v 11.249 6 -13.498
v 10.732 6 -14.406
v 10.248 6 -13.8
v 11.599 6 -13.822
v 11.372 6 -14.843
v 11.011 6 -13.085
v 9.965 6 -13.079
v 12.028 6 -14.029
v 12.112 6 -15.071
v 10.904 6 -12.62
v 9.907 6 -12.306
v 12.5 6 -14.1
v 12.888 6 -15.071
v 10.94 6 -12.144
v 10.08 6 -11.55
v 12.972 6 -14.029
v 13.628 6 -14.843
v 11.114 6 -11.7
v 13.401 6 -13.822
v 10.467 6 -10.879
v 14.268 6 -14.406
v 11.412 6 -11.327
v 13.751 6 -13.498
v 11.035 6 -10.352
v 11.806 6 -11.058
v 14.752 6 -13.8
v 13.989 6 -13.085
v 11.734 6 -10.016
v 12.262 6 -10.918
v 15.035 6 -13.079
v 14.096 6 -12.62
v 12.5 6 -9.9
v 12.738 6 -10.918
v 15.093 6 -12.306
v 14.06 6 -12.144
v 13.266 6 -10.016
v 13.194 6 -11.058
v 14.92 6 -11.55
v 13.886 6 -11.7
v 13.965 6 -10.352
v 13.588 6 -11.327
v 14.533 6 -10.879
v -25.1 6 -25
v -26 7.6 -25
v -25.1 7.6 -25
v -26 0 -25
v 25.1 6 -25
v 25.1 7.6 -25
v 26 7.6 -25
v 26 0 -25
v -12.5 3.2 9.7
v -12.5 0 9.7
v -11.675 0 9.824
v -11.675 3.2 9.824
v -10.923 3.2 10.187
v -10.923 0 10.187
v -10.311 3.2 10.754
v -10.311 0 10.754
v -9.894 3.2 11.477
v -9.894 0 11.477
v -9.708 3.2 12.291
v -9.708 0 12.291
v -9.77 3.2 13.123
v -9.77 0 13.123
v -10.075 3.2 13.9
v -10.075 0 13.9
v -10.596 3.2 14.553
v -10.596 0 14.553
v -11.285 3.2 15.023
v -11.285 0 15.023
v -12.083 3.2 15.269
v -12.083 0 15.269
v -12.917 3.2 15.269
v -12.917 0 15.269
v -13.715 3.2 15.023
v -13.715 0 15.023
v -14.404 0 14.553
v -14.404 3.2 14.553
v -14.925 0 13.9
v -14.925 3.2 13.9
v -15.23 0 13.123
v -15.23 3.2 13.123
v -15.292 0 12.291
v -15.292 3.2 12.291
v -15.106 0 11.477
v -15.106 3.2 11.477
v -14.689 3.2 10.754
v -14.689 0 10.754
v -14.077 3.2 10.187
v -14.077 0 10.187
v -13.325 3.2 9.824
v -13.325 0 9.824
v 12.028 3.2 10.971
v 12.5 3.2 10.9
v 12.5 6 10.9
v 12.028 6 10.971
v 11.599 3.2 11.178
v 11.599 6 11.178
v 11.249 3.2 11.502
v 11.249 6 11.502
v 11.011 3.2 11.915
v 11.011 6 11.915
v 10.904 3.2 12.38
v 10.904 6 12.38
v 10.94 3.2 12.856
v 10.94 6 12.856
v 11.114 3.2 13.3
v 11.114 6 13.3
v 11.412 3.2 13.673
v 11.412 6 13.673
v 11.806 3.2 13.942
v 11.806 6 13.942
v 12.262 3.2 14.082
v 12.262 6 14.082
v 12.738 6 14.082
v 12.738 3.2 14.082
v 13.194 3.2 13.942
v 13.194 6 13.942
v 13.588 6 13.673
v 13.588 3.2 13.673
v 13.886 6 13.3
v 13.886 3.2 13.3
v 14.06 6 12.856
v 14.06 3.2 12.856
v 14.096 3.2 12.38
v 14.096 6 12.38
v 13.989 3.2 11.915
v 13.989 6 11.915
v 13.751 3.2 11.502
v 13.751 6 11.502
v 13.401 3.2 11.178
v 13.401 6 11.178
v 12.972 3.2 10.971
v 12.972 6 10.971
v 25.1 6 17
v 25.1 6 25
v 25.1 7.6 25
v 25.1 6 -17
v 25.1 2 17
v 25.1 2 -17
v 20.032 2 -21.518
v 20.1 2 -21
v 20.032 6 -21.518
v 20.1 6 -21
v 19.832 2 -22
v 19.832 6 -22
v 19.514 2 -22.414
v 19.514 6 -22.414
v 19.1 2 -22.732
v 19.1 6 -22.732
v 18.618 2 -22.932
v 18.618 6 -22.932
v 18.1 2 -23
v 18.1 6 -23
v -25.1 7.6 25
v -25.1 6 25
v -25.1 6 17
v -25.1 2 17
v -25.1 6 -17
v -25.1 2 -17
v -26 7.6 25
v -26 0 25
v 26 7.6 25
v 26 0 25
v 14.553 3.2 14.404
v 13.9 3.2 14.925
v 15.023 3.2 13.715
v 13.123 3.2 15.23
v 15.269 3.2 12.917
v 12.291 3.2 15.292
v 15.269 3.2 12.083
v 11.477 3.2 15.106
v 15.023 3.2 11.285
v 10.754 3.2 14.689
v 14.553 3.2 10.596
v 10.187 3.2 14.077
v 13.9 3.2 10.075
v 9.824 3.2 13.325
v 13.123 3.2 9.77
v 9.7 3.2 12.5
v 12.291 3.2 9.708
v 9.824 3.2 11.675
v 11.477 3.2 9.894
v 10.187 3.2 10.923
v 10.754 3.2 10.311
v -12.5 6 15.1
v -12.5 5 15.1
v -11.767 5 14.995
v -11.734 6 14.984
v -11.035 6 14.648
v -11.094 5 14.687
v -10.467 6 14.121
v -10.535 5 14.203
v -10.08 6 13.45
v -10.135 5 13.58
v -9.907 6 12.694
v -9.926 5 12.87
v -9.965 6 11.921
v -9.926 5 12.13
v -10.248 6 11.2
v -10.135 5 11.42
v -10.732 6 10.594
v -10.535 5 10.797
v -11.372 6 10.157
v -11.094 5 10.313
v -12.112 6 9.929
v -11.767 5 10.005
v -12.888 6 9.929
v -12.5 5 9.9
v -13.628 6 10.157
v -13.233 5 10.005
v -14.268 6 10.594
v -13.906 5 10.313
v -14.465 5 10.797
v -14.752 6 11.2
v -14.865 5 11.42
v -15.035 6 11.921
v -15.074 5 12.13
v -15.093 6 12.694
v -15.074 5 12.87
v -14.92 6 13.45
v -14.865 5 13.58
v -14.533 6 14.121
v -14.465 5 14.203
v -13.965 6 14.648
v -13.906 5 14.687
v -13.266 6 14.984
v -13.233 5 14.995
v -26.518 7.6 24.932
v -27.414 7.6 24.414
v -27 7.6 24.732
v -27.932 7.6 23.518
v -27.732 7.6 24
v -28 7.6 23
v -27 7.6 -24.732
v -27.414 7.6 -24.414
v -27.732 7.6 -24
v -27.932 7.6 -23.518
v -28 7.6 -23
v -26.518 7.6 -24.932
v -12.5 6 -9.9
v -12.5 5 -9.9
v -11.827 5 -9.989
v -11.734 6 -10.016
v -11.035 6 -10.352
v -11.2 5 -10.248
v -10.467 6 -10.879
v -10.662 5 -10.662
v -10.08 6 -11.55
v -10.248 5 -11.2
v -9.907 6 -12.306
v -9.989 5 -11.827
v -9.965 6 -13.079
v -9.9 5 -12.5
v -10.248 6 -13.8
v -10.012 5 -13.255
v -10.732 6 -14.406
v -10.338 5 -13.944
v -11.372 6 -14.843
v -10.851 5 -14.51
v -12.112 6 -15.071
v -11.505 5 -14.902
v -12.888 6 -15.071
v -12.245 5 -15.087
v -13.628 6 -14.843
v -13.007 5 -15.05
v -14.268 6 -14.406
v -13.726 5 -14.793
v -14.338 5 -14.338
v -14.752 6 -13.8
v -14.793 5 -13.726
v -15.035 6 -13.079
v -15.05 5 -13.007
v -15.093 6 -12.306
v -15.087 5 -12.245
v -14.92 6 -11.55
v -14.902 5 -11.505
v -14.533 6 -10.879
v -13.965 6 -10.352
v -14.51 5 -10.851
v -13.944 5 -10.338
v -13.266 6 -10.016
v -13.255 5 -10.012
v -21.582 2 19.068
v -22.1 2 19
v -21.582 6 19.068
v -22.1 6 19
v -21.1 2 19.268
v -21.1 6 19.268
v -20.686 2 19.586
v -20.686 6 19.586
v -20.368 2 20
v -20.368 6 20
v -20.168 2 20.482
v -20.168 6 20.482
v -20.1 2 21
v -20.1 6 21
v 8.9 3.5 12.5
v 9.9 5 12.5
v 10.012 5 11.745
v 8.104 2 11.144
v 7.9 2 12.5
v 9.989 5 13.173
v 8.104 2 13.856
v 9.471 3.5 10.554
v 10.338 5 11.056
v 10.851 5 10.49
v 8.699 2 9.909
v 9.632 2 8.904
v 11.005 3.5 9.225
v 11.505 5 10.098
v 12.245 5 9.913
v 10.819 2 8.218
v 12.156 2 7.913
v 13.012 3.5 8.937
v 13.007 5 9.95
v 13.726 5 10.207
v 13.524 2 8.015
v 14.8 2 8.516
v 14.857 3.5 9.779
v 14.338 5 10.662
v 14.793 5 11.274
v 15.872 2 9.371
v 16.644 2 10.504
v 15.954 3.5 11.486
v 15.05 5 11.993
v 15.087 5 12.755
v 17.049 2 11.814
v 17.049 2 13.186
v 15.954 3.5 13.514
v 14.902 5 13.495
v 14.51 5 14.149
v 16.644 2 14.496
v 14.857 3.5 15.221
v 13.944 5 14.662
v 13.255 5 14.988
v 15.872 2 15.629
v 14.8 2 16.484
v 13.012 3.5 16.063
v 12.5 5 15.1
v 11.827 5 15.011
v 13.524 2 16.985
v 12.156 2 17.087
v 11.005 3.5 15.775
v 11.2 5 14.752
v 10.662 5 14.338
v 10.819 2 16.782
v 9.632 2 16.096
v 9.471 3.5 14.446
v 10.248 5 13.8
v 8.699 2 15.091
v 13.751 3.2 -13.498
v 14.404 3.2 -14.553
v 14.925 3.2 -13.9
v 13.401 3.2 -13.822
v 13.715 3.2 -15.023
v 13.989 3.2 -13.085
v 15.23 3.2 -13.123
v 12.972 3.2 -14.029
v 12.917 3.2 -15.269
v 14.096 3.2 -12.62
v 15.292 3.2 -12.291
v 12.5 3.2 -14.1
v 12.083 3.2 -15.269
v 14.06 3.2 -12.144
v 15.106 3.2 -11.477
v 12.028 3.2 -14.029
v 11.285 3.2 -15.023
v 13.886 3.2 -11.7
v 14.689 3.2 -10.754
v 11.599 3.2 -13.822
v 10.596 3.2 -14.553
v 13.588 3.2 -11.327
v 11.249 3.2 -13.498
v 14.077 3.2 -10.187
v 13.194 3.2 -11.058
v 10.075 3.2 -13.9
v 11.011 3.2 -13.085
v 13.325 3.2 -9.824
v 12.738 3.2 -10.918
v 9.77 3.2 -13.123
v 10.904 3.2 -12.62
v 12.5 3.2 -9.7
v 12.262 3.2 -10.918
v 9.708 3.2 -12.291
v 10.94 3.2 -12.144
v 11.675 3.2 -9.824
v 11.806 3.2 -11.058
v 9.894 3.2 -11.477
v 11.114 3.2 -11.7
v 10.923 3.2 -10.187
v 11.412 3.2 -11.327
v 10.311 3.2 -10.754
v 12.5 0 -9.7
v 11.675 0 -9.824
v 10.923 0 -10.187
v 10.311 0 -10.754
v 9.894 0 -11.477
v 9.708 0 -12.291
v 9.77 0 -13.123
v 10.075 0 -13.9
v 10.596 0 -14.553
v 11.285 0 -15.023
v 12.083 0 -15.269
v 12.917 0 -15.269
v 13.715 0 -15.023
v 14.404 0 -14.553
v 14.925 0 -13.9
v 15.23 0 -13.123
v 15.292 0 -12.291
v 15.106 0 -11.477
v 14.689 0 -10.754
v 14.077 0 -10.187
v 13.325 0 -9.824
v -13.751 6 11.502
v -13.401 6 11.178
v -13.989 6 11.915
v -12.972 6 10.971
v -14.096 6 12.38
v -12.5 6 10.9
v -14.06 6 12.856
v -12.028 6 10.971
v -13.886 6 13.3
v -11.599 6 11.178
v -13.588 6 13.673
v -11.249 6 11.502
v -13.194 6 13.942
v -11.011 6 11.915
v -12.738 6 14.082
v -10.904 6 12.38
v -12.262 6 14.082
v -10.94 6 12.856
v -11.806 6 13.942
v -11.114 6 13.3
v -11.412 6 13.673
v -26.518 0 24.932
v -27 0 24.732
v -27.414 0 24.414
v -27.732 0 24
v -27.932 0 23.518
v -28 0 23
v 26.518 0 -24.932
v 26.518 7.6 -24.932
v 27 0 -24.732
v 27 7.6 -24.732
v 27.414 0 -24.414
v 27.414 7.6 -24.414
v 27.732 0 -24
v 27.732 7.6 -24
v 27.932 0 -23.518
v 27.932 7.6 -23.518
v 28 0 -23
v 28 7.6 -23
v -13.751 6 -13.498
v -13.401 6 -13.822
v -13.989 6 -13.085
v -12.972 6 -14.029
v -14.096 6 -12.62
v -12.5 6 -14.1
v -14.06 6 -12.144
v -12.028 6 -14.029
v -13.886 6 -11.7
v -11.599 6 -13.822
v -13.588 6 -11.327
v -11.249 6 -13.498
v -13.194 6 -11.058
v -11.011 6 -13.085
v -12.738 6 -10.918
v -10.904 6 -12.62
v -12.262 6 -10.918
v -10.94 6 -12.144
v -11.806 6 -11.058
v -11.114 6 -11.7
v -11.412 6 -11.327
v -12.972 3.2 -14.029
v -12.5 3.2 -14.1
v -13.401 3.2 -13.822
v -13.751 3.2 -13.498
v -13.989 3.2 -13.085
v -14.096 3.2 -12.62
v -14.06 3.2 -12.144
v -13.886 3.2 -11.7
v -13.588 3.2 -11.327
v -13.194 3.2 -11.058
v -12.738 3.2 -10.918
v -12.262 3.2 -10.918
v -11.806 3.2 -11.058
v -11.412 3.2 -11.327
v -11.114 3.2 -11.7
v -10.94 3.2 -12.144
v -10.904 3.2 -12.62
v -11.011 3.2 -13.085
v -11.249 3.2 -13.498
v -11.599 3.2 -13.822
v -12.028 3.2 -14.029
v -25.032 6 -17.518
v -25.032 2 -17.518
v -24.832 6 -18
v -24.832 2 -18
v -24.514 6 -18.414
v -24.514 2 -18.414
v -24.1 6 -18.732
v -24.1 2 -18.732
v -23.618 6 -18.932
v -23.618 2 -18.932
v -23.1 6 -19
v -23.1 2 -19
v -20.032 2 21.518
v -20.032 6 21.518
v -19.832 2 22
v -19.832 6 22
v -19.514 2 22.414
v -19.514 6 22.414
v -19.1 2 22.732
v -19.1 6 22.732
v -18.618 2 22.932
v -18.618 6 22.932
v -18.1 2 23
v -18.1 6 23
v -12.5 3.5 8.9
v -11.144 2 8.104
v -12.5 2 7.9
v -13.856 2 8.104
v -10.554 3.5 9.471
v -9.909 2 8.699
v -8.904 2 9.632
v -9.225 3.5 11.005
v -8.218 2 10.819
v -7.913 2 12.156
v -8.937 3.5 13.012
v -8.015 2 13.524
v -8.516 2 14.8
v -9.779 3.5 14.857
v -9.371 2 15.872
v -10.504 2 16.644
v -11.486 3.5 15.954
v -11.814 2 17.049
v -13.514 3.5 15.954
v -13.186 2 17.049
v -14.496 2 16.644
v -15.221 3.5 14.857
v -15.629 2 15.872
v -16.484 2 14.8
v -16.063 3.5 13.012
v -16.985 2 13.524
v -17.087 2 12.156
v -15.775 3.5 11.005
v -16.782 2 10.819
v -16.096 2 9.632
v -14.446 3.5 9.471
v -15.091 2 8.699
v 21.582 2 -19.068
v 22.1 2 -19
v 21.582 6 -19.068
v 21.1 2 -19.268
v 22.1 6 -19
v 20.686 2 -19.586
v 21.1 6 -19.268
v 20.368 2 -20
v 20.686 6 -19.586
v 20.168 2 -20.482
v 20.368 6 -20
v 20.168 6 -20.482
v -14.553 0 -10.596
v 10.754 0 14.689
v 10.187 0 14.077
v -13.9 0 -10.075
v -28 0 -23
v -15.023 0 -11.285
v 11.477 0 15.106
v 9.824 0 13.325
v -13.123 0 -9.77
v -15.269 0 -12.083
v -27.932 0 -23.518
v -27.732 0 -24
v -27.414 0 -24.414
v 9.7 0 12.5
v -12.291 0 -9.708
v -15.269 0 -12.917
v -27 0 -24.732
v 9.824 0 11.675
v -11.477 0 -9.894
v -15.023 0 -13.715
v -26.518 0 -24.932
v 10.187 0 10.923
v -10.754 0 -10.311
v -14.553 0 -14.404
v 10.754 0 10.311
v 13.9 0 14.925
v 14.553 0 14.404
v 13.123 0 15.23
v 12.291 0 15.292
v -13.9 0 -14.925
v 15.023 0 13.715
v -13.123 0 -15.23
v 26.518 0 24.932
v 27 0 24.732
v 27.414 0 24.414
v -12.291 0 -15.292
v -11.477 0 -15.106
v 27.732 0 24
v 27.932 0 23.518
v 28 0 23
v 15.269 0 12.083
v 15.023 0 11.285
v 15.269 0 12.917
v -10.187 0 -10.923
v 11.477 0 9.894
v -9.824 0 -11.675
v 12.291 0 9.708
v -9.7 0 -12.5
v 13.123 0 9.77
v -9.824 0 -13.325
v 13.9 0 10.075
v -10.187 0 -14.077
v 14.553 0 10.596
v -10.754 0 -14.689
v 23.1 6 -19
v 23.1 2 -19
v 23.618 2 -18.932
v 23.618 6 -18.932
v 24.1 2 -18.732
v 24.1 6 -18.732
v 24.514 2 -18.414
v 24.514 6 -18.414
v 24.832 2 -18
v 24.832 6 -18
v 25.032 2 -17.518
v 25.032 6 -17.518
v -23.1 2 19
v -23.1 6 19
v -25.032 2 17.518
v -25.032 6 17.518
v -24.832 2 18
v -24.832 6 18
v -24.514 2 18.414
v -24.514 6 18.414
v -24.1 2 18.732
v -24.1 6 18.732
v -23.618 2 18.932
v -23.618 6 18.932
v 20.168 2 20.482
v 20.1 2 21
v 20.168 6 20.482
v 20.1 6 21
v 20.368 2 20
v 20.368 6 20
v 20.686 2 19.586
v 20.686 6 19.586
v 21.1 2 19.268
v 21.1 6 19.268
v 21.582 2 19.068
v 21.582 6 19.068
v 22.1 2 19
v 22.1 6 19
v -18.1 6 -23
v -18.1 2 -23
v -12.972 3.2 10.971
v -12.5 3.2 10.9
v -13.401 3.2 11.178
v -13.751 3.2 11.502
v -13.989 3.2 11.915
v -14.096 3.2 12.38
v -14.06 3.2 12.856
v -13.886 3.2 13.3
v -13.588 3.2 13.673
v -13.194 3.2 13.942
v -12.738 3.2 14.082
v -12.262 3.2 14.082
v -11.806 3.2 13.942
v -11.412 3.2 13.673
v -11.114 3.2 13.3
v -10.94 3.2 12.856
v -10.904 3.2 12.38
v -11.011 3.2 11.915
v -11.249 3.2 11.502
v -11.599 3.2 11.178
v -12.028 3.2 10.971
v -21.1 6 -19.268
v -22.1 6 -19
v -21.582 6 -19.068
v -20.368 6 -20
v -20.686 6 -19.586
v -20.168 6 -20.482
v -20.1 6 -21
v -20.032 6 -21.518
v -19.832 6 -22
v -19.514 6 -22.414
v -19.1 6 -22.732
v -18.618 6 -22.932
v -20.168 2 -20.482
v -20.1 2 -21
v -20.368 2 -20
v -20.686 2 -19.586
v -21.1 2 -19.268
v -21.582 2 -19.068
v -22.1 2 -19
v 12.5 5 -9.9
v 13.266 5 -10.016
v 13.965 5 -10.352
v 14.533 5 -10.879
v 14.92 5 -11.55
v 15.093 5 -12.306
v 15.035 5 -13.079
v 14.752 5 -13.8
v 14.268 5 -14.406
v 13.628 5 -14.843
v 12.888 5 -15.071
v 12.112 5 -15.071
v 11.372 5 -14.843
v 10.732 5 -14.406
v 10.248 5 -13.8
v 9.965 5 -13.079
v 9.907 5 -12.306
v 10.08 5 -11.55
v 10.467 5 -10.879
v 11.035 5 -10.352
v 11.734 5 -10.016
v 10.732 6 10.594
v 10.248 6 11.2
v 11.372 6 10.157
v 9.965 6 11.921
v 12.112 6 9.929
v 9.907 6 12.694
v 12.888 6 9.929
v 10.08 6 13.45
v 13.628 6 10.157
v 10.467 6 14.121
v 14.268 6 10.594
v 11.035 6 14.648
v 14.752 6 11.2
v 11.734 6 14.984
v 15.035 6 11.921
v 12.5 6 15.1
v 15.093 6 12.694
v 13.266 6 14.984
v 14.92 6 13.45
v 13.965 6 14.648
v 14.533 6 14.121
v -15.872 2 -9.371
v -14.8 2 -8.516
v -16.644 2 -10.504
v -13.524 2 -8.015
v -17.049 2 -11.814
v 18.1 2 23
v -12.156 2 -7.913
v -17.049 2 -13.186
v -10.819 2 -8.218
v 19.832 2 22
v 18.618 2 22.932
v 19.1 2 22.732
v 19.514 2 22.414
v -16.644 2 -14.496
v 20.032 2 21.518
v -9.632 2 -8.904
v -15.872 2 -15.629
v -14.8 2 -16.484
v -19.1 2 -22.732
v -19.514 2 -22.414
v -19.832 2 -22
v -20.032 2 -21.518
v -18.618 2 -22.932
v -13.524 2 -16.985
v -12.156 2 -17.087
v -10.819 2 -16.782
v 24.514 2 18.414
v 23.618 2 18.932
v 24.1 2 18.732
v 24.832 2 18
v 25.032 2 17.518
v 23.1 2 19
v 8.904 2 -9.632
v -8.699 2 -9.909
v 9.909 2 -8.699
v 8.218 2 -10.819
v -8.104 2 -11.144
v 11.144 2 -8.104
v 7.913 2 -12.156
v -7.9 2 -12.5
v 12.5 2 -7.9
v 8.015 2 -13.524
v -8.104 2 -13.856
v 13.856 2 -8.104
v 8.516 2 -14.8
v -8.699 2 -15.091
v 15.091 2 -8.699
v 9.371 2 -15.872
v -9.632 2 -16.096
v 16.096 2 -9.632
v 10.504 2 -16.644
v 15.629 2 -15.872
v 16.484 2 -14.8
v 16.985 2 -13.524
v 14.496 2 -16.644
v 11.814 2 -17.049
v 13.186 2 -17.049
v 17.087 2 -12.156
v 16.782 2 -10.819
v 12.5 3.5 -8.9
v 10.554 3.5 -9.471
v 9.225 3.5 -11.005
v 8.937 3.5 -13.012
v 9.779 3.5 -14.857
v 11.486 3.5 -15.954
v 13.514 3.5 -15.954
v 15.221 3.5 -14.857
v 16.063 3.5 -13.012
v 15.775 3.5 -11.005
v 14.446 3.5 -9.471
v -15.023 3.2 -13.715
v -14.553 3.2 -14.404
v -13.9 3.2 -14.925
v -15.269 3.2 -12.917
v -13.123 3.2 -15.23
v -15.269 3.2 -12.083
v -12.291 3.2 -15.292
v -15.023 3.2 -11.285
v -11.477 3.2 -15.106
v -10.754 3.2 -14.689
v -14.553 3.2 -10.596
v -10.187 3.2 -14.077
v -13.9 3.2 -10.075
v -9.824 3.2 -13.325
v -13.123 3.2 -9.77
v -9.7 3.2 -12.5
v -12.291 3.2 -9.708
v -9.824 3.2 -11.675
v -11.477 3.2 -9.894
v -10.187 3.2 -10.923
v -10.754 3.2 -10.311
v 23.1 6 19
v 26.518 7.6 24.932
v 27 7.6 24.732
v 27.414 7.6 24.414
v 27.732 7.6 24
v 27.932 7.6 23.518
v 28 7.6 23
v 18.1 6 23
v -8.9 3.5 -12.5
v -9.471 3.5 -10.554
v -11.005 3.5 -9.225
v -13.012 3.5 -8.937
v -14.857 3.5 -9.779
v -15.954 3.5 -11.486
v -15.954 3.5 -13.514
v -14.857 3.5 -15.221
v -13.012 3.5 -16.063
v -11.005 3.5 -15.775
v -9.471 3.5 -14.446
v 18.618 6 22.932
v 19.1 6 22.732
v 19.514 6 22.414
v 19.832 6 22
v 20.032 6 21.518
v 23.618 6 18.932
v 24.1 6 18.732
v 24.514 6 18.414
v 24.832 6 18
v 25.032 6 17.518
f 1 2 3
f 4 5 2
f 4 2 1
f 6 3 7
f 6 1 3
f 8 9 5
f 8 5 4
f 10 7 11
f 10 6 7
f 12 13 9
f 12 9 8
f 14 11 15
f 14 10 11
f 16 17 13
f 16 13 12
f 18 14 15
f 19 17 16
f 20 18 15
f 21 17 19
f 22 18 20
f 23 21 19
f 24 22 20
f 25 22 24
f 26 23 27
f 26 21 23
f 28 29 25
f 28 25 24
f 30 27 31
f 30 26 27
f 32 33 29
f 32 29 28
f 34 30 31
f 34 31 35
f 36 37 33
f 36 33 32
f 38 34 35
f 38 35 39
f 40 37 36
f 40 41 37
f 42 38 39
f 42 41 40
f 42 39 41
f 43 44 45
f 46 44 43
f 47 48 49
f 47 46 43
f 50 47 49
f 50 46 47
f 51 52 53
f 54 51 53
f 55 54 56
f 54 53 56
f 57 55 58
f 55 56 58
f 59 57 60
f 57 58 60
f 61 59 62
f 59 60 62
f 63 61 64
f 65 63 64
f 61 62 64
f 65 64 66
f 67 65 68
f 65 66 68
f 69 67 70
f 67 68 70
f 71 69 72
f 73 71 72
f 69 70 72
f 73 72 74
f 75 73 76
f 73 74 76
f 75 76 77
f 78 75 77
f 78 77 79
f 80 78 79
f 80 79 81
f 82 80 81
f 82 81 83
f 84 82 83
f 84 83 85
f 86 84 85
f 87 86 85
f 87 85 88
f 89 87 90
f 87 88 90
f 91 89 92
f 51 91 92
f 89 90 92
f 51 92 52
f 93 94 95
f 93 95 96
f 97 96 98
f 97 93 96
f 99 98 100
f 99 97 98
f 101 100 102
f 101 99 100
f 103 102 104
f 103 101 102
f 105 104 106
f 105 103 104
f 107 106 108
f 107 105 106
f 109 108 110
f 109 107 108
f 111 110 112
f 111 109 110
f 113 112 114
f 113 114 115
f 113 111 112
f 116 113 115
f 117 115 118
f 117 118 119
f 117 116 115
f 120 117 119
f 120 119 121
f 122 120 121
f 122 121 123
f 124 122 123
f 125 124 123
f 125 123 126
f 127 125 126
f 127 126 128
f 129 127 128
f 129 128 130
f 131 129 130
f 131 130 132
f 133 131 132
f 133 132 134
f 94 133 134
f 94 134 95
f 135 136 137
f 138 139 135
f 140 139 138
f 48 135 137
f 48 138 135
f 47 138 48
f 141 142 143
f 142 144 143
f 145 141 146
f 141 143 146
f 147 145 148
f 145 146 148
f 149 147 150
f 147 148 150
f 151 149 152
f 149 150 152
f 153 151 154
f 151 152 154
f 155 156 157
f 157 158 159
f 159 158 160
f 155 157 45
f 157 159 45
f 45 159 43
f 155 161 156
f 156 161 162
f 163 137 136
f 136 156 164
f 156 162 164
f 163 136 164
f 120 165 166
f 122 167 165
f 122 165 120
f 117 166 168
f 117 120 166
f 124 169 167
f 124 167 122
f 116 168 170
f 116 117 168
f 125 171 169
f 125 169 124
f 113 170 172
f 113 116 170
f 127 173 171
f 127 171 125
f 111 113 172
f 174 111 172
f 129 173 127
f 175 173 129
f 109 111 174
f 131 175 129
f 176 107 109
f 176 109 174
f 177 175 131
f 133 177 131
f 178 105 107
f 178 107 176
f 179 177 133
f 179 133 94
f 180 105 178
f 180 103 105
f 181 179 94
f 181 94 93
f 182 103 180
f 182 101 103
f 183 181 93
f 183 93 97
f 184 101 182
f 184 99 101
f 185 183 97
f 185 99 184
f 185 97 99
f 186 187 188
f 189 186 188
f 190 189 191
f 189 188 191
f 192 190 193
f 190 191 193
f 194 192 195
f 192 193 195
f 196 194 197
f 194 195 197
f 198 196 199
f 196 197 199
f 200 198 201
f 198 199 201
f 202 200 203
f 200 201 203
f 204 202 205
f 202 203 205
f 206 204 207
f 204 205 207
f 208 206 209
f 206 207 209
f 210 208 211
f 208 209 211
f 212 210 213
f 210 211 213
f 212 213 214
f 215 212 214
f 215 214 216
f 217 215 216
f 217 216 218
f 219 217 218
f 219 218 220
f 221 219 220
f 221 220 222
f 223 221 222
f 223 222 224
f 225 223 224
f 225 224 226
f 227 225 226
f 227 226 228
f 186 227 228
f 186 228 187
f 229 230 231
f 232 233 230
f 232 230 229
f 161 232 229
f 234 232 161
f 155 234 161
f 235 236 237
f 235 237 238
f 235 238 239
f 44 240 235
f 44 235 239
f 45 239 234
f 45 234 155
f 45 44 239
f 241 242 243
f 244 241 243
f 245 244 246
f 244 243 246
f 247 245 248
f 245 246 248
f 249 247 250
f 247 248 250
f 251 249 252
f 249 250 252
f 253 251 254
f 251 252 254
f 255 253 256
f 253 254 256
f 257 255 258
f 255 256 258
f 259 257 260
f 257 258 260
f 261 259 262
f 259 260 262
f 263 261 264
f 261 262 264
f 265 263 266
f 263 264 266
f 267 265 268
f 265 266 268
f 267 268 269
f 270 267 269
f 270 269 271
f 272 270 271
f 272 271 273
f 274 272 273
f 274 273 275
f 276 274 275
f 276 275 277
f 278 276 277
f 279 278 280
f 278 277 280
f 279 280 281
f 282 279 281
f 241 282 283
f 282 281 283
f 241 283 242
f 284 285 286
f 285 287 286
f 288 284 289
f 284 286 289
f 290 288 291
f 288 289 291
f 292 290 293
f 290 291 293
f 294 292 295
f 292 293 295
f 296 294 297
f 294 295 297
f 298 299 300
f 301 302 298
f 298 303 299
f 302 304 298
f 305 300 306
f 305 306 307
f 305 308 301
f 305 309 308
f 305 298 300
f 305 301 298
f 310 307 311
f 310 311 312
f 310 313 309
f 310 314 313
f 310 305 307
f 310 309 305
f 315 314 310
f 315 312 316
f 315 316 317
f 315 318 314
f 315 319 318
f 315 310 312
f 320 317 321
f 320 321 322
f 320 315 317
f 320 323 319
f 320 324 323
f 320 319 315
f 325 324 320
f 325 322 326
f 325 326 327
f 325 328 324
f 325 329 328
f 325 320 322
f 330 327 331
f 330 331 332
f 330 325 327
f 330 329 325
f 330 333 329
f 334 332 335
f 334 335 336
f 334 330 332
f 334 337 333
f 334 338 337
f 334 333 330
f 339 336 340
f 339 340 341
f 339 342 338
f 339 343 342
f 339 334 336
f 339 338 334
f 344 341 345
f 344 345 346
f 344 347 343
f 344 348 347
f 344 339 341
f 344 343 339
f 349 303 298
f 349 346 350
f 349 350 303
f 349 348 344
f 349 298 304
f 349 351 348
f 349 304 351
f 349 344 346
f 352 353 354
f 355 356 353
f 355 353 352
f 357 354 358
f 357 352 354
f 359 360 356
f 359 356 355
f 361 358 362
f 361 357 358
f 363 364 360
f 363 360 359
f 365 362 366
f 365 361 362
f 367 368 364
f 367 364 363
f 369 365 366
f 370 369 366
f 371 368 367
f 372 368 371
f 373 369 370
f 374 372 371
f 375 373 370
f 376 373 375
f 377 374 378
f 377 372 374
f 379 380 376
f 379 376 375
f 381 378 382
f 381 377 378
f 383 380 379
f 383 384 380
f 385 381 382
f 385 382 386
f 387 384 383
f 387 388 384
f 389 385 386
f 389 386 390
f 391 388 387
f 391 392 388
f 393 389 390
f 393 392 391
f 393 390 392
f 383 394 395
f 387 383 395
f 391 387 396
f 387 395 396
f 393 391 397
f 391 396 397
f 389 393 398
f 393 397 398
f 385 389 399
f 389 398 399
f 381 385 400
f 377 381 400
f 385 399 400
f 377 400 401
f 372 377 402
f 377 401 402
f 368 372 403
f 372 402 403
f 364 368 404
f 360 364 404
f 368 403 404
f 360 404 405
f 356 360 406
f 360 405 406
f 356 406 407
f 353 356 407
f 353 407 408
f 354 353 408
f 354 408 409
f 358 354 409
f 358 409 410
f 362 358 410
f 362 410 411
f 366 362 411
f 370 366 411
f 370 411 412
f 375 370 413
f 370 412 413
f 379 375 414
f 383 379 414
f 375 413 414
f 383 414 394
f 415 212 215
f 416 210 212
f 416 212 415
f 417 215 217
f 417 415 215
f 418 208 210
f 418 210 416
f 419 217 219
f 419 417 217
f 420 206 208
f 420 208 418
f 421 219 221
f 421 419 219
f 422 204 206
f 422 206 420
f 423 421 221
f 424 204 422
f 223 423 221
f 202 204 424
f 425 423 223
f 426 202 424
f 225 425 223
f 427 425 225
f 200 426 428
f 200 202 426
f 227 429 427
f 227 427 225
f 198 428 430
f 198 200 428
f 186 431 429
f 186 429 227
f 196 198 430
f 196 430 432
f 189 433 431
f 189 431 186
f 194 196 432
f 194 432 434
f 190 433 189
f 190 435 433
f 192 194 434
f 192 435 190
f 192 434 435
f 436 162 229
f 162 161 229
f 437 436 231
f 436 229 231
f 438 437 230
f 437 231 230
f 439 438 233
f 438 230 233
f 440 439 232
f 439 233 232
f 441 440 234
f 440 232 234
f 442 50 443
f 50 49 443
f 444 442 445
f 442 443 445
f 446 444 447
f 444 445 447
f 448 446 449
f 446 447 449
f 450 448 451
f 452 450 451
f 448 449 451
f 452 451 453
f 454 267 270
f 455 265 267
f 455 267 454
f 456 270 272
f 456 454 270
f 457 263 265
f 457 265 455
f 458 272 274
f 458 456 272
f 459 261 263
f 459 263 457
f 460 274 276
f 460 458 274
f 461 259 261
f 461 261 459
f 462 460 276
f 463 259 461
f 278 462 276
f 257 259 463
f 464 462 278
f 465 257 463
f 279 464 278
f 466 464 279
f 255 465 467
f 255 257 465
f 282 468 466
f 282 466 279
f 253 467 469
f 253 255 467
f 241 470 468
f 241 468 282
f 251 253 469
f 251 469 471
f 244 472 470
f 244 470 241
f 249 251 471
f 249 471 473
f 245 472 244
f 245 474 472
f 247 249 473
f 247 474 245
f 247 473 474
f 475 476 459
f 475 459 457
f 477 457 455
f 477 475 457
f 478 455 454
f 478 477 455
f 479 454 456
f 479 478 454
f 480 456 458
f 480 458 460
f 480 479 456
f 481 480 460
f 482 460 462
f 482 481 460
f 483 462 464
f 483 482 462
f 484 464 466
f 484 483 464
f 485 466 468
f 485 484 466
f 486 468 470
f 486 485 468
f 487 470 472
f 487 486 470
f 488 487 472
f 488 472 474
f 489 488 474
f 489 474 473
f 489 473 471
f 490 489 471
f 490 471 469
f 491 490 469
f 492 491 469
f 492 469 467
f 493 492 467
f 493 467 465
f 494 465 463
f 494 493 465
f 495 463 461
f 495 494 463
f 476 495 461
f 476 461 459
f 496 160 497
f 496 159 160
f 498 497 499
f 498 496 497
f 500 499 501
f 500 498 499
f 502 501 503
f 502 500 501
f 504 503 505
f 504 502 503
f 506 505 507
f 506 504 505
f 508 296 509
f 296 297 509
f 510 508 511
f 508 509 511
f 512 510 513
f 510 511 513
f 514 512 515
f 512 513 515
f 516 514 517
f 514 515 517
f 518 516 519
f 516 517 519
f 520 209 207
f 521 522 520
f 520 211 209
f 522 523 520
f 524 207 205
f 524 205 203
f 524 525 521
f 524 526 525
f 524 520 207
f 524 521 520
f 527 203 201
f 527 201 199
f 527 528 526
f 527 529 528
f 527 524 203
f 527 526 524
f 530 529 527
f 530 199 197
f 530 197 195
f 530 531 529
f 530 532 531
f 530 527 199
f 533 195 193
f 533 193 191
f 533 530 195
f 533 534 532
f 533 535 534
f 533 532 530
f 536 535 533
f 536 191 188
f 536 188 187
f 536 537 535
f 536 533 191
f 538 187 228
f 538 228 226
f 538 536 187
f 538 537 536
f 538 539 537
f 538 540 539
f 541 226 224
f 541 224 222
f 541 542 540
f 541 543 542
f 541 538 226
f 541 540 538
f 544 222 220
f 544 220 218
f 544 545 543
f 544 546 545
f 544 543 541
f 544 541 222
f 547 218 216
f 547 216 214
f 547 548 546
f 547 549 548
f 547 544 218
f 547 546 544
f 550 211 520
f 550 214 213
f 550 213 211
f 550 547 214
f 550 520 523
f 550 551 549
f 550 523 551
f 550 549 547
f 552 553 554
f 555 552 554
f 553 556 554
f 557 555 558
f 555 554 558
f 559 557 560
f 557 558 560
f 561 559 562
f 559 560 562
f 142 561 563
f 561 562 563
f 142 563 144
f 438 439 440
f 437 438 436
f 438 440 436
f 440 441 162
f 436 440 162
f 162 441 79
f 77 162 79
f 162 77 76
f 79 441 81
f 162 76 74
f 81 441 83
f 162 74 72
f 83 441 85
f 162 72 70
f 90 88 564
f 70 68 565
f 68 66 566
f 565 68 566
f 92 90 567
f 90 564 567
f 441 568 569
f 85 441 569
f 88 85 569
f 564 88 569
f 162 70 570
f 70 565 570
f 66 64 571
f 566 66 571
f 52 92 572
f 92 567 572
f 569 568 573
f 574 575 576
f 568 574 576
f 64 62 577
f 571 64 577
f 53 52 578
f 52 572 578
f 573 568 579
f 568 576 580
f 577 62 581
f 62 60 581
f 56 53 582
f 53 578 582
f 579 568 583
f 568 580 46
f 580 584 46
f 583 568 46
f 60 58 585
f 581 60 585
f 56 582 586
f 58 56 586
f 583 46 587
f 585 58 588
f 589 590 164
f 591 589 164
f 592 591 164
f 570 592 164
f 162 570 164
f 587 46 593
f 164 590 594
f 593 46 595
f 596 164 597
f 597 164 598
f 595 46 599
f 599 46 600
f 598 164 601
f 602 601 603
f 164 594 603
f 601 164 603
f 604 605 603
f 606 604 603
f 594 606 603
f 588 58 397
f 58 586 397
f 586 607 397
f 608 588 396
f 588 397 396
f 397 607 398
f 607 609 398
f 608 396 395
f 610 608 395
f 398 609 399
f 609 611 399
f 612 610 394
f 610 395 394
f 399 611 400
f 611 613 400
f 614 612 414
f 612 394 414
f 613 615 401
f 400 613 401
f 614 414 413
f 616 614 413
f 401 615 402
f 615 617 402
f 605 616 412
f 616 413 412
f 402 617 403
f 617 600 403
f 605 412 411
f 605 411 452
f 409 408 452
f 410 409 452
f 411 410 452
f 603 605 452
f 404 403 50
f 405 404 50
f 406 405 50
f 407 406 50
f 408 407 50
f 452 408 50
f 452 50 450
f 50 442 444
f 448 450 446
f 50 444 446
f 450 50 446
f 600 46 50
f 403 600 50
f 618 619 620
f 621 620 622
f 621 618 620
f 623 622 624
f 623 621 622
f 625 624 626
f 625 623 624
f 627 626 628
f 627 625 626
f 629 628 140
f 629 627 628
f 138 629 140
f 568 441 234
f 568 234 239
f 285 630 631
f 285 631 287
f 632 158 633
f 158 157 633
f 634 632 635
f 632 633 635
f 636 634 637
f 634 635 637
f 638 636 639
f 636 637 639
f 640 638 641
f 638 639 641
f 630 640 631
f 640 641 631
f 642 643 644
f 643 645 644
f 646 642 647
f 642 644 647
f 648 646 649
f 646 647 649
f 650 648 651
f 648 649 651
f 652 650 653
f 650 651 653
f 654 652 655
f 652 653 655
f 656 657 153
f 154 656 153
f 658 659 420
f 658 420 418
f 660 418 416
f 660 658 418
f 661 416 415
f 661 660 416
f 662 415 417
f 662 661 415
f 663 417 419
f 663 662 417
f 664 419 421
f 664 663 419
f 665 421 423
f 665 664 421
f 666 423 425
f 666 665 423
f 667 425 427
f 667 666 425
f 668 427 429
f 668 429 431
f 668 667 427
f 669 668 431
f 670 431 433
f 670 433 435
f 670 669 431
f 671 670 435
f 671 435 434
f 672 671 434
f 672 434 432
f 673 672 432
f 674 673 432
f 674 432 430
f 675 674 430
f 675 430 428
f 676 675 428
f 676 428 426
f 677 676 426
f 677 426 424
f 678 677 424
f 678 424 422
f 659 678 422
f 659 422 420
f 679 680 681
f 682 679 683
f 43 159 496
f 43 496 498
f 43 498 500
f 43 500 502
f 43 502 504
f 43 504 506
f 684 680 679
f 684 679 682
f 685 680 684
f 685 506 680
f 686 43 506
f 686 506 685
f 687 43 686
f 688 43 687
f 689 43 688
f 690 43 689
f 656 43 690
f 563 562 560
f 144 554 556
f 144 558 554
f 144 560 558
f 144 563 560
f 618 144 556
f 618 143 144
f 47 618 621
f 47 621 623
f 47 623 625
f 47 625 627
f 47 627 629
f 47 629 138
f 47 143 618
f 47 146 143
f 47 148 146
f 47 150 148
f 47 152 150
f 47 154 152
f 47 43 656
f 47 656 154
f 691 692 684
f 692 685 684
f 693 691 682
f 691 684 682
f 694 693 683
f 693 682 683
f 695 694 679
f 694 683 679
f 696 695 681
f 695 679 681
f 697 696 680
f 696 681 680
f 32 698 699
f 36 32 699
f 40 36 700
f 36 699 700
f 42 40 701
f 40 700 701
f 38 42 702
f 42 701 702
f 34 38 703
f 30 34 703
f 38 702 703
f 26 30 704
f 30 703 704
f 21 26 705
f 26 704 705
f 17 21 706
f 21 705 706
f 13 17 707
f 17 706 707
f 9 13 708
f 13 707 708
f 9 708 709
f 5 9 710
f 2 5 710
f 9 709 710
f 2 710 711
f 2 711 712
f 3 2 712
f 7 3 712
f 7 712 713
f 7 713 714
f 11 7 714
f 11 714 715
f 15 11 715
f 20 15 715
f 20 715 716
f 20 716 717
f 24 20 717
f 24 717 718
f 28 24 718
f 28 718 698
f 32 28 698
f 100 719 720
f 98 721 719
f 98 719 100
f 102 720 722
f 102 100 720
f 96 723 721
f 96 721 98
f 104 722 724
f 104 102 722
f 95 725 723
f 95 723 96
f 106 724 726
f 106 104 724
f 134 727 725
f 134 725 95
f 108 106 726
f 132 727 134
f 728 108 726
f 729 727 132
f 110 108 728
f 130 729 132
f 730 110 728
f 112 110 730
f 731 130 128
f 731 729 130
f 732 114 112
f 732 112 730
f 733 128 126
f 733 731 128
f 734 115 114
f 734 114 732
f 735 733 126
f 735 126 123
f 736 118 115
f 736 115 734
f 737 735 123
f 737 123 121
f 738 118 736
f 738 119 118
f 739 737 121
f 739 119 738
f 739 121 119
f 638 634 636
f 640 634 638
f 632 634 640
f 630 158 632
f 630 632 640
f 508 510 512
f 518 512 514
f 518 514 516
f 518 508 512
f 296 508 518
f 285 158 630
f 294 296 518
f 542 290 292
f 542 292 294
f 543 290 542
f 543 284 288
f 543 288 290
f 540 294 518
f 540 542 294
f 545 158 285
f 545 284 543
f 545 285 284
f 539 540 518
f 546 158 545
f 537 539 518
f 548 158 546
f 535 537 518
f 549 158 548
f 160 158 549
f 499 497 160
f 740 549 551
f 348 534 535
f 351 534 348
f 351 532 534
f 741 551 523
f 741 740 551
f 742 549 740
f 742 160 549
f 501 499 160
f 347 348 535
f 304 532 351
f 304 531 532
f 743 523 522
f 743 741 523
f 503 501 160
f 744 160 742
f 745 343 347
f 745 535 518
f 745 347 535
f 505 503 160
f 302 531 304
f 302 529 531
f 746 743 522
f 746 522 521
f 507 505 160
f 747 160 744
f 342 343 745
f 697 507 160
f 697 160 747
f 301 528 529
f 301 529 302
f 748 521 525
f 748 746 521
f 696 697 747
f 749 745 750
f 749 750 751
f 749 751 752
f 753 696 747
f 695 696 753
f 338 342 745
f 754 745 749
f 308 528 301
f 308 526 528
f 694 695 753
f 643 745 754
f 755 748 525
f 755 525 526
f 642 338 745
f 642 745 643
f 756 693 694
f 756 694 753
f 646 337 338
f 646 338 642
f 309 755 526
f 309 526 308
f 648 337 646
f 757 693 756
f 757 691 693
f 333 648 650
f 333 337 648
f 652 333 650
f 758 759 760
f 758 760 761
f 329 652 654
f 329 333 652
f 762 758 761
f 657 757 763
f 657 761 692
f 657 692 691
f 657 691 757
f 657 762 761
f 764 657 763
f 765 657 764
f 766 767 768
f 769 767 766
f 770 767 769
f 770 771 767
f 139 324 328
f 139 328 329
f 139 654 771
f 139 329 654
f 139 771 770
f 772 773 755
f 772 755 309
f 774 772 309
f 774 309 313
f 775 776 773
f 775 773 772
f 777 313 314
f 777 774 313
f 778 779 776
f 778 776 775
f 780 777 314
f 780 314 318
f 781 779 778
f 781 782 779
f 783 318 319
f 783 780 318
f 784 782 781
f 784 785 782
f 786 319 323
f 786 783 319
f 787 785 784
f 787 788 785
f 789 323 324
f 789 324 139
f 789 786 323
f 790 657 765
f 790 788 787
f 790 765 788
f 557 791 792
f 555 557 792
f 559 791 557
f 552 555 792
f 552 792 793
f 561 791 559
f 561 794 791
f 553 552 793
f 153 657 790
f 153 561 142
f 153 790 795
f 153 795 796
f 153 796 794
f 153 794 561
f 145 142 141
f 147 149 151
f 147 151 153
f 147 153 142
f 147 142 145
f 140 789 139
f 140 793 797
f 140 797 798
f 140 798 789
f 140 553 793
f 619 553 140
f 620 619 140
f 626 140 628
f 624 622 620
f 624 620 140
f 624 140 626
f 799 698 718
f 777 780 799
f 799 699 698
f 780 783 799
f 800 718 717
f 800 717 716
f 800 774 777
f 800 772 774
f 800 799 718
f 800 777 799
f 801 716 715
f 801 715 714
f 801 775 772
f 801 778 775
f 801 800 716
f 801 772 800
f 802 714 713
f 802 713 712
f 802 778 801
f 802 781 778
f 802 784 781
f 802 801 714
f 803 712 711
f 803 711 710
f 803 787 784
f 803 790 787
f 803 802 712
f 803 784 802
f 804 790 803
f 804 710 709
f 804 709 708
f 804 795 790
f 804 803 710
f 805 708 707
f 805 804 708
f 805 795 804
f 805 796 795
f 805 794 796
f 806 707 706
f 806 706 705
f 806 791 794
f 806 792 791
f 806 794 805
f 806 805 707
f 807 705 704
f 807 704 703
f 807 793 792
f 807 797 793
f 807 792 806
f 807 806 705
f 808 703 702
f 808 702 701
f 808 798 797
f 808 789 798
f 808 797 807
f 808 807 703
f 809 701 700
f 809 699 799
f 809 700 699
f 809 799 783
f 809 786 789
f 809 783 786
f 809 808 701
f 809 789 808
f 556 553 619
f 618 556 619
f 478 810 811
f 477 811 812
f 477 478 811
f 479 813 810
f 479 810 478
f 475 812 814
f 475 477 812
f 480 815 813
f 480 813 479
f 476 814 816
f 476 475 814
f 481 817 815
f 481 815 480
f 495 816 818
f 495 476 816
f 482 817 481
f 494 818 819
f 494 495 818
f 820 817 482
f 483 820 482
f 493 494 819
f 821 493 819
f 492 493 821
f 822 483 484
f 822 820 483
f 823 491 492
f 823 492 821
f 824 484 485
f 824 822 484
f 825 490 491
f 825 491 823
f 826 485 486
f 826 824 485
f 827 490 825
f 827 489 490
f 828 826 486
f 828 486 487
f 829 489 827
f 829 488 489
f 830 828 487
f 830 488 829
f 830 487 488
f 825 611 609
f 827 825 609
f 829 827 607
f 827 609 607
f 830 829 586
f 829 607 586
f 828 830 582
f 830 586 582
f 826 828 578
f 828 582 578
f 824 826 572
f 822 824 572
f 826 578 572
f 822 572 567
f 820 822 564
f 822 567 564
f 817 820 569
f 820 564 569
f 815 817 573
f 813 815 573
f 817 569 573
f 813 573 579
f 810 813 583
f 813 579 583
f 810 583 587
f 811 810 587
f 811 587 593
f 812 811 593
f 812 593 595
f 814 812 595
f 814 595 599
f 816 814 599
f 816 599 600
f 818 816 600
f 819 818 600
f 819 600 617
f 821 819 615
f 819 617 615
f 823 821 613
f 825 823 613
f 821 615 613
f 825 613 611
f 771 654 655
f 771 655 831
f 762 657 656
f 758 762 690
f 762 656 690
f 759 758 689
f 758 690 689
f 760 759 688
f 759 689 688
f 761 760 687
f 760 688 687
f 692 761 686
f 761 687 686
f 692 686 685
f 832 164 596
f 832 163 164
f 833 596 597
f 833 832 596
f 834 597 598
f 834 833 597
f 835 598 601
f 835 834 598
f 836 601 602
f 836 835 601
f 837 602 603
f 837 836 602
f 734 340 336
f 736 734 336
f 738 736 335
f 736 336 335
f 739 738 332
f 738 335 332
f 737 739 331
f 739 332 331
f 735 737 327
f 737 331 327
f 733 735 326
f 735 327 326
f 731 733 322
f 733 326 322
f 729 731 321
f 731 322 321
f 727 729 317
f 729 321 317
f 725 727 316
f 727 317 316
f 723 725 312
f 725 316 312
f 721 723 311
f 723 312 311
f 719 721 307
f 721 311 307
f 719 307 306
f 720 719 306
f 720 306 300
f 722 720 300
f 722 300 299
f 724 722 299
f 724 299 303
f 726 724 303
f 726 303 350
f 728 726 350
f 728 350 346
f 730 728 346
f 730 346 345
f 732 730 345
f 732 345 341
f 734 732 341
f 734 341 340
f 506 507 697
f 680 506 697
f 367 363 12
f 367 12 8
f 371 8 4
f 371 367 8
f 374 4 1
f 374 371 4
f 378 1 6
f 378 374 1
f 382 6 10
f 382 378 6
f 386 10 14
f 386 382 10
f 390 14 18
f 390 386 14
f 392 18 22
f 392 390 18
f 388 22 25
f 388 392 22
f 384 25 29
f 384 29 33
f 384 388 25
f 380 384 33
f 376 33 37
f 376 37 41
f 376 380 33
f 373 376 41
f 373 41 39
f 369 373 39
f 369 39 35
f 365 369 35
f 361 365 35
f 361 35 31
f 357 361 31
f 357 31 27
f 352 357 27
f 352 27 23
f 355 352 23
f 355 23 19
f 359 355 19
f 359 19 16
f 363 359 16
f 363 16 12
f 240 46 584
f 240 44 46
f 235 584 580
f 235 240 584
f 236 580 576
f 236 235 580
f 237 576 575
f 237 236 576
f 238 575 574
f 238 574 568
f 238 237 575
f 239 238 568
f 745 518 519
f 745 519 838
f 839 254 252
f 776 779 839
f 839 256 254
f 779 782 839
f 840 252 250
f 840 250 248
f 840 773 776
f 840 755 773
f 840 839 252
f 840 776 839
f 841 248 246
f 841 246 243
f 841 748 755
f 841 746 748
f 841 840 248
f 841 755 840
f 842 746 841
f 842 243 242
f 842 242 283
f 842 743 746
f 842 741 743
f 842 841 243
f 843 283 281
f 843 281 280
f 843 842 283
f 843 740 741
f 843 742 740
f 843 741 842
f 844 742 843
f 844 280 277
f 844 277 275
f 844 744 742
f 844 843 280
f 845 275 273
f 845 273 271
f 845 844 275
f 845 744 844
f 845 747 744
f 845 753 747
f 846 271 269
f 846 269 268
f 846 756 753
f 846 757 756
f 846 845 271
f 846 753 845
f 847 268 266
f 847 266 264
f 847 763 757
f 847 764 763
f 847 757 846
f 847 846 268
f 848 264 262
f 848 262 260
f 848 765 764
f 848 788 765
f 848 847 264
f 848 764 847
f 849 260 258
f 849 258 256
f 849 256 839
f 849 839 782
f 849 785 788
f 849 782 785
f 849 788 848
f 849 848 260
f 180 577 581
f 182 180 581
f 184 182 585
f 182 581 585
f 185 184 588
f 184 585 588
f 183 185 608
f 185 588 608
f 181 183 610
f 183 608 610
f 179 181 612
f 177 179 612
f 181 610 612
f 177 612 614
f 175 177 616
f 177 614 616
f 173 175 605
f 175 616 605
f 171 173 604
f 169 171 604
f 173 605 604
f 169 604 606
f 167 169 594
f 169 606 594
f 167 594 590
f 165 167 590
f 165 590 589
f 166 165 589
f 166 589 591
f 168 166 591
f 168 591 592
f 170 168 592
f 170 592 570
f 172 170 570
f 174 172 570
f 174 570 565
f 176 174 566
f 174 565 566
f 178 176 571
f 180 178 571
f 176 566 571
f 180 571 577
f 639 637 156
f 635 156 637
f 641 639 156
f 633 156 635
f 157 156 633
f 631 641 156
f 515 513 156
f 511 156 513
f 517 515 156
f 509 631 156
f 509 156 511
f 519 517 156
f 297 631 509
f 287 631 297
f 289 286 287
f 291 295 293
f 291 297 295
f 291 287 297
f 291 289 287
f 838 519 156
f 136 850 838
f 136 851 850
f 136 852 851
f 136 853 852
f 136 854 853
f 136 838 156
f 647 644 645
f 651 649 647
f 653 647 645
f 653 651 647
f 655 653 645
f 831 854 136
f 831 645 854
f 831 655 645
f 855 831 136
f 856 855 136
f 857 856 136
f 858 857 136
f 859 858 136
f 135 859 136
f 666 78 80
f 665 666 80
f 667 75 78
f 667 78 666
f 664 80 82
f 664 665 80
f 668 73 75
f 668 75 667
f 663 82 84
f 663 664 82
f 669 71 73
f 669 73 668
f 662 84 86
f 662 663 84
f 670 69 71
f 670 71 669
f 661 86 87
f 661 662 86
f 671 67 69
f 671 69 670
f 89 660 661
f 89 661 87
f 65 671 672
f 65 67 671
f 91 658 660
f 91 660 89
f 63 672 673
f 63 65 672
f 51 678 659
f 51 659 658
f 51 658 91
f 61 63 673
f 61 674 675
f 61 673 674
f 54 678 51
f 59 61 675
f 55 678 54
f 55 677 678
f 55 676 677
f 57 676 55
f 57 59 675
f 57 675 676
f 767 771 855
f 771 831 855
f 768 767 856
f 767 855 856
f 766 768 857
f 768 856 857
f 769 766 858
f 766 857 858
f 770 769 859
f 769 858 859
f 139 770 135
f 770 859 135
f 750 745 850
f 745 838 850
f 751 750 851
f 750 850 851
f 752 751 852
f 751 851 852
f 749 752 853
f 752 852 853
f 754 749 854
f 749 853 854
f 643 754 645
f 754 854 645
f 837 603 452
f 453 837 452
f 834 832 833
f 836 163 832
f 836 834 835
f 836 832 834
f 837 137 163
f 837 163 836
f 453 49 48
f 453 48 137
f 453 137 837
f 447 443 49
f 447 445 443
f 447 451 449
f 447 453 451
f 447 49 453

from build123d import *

# Parameters (mm, degrees)
SKETCH_1_W               = 56
SKETCH_1_H               = 50
SKETCH_1_R               = 1.6
EXTRUDE_1_DEPTH          = 7.6
CUT_EXTRUDE_START        = -1.6
SKETCH_2_W               = 50.2
SKETCH_2_H               = 50
SKETCH_2_R               = 1.6
CUT_EXTRUDE_1_DEPTH      = 1.6
CUT_EXTRUDE_START_2      = -4
SKETCH_3_W               = 40.2
SKETCH_3_H               = 38
SKETCH_3_R               = 1.6
SKETCH_3_H_2             = 6
SKETCH_3_W_2             = 5
CUT_EXTRUDE_2_DEPTH      = 4
SKETCH_4_R               = 2.6
SKETCH_4_R_2             = 1.6
EXTRUDE_2_DEPTH          = 4
SKETCH_6_W               = 40.2
SKETCH_6_H               = 2
EXTRUDE_3_DEPTH          = 4
FILLET_2_R               = 2
SKETCH_7_R               = 2.8
CUT_EXTRUDE_3_DEPTH      = 3.2
PATTERN_CIRCULAR_2_COUNT = 4


with BuildPart() as part:
    # 草图1 → 凸台-拉伸1 (new body)
    with BuildSketch(Plane(origin=(0, 0, 0), x_dir=(1, 0, 0), z_dir=(0, 1, 0))):
        Rectangle(SKETCH_1_W, SKETCH_1_H)
        with Locations(Location((-12.5, 12.5, 0), (0, 0, 90))):
            Circle(SKETCH_1_R, mode=Mode.SUBTRACT)
        with Locations(Location((12.5, 12.5, 0), (0, 0, 90))):
            Circle(SKETCH_1_R, mode=Mode.SUBTRACT)
        with Locations(Location((12.5, -12.5, 0), (0, 0, 90))):
            Circle(SKETCH_1_R, mode=Mode.SUBTRACT)
        with Locations(Location((-12.5, -12.5, 0), (0, 0, 90))):
            Circle(SKETCH_1_R, mode=Mode.SUBTRACT)
    extrude(amount=EXTRUDE_1_DEPTH)

    # 草图2 → 切除-拉伸1 (cut)
    with BuildSketch(Plane(origin=(0, 7.6, 0), x_dir=(1, 0, 0), z_dir=(0, 1, 0)).offset(CUT_EXTRUDE_START)):
        Rectangle(SKETCH_2_W, SKETCH_2_H)
        with Locations(Location((-12.5, -12.5, 0), (0, 0, 90))):
            Circle(SKETCH_2_R, mode=Mode.SUBTRACT)
        with Locations(Location((12.5, -12.5, 0), (0, 0, 90))):
            Circle(SKETCH_2_R, mode=Mode.SUBTRACT)
        with Locations(Location((-12.5, 12.5, 0), (0, 0, 90))):
            Circle(SKETCH_2_R, mode=Mode.SUBTRACT)
        with Locations(Location((12.5, 12.5, 0), (0, 0, 90))):
            Circle(SKETCH_2_R, mode=Mode.SUBTRACT)
    extrude(amount=CUT_EXTRUDE_1_DEPTH, mode=Mode.SUBTRACT)

    # 草图3 → 切除-拉伸2 (cut)
    # profile 1 of 5: a face of its own
    with BuildSketch(Plane(origin=(0, 6, 0), x_dir=(1, 0, 0), z_dir=(0, 1, 0)).offset(CUT_EXTRUDE_START_2)):
        Rectangle(SKETCH_3_W, SKETCH_3_H)
        with Locations(Location((-12.5, -12.5, 0), (0, 0, 90))):
            Circle(SKETCH_3_R, mode=Mode.SUBTRACT)
        with Locations(Location((12.5, -12.5, 0), (0, 0, 90))):
            Circle(SKETCH_3_R, mode=Mode.SUBTRACT)
        with Locations(Location((-12.5, 12.5, 0), (0, 0, 90))):
            Circle(SKETCH_3_R, mode=Mode.SUBTRACT)
        with Locations(Location((12.5, 12.5, 0), (0, 0, 90))):
            Circle(SKETCH_3_R, mode=Mode.SUBTRACT)
    # profile 2 of 5: a face of its own
    with BuildSketch(Plane(origin=(0, 6, 0), x_dir=(1, 0, 0), z_dir=(0, 1, 0)).offset(CUT_EXTRUDE_START_2)):
        with Locations((0, 22)):
            Rectangle(SKETCH_3_W, SKETCH_3_H_2)
    # profile 3 of 5: a face of its own
    with BuildSketch(Plane(origin=(0, 6, 0), x_dir=(1, 0, 0), z_dir=(0, 1, 0)).offset(CUT_EXTRUDE_START_2)):
        with Locations((22.6, 0)):
            Rectangle(SKETCH_3_W_2, SKETCH_3_H)
    # profile 4 of 5: a face of its own
    with BuildSketch(Plane(origin=(0, 6, 0), x_dir=(1, 0, 0), z_dir=(0, 1, 0)).offset(CUT_EXTRUDE_START_2)):
        with Locations((-22.6, 0)):
            Rectangle(SKETCH_3_W_2, SKETCH_3_H)
    # profile 5 of 5: a face of its own
    with BuildSketch(Plane(origin=(0, 6, 0), x_dir=(1, 0, 0), z_dir=(0, 1, 0)).offset(CUT_EXTRUDE_START_2)):
        with Locations((0, -22)):
            Rectangle(SKETCH_3_W, SKETCH_3_H_2)
    extrude(amount=CUT_EXTRUDE_2_DEPTH, mode=Mode.SUBTRACT)

    # 草图4 → 凸台-拉伸2 (add)
    # profile 1 of 4: a face of its own
    with BuildSketch(Plane(origin=(0, 2, 0), x_dir=(1, 0, 0), z_dir=(0, 1, 0))):
        with Locations(Location((-12.5, 12.5, 0), (0, 0, 270))):
            Circle(SKETCH_4_R)
        with Locations(Location((-12.5, 12.5, 0), (0, 0, 90))):
            Circle(SKETCH_4_R_2, mode=Mode.SUBTRACT)
    # profile 2 of 4: a face of its own
    with BuildSketch(Plane(origin=(0, 2, 0), x_dir=(1, 0, 0), z_dir=(0, 1, 0))):
        with Locations(Location((12.5, 12.5, 0), (0, 0, 270))):
            Circle(SKETCH_4_R)
        with Locations(Location((12.5, 12.5, 0), (0, 0, 90))):
            Circle(SKETCH_4_R_2, mode=Mode.SUBTRACT)
    # profile 3 of 4: a face of its own
    with BuildSketch(Plane(origin=(0, 2, 0), x_dir=(1, 0, 0), z_dir=(0, 1, 0))):
        with Locations(Location((12.5, -12.5, 0), (0, 0, 270))):
            Circle(SKETCH_4_R)
        with Locations(Location((12.5, -12.5, 0), (0, 0, 90))):
            Circle(SKETCH_4_R_2, mode=Mode.SUBTRACT)
    # profile 4 of 4: a face of its own
    with BuildSketch(Plane(origin=(0, 2, 0), x_dir=(1, 0, 0), z_dir=(0, 1, 0))):
        with Locations(Location((-12.5, -12.5, 0), (0, 0, 270))):
            Circle(SKETCH_4_R)
        with Locations(Location((-12.5, -12.5, 0), (0, 0, 90))):
            Circle(SKETCH_4_R_2, mode=Mode.SUBTRACT)
    extrude(amount=EXTRUDE_2_DEPTH)

    # 草图6 → 凸台-拉伸3 (add)
    with BuildSketch(Plane(origin=(0, 2, 0), x_dir=(1, 0, 0), z_dir=(0, 1, 0))):
        with Locations((0, -24)):
            Rectangle(SKETCH_6_W, SKETCH_6_H)
        with Locations((0, 24)):
            Rectangle(SKETCH_6_W, SKETCH_6_H)
    extrude(amount=EXTRUDE_3_DEPTH)

    # 圆角2
    fillet_2_edges = [part.edges().sort_by_distance(p)[0] for p in [
        (25.1, 4, 19),
        (20.1, 4, 19),
        (20.1, 4, 23),
        (-28, 3.8, -25),
        (-28, 3.8, 25),
        (28, 3.8, 25),
        (28, 3.8, -25),
        (-20.1, 4, 23),
        (-25.1, 4, 19),
        (-20.1, 4, 19),
        (25.1, 4, -19),
        (20.1, 4, -19),
        (20.1, 4, -23),
        (-20.1, 4, -23),
        (-20.1, 4, -19),
        (-25.1, 4, -19),
    ]]
    fillet(fillet_2_edges, radius=FILLET_2_R - 0.0001)  # a hair under: the kernel refuses the full size

    # 草图5 → 旋转1 (revolve)
    with BuildSketch(Plane.XY.offset(12.5), mode=Mode.PRIVATE) as revolve_1_sk:
        Polygon((-9.9, 5), (-7.9, 2), (-9.9, 2), align=None)
    revolve_1 = revolve(revolve_1_sk.sketch.rotate(Axis((-12.5, 6, 12.5), (0, -1, 0)), 270), axis=Axis((-12.5, 6, 12.5), (0, -1, 0)))

    # 草图7 → 切除-拉伸3 (cut)
    with BuildSketch(Plane.XZ):
        with Locations(Location((-12.5, 12.5, 0), (0, 0, 270))):
            Circle(SKETCH_7_R)
    cut_extrude_3 = extrude(amount=-CUT_EXTRUDE_3_DEPTH, mode=Mode.SUBTRACT)

    # 阵列(圆周)2: 旋转1, 切除-拉伸3 ×4 about axis
    pattern_circular_2_axis = Axis((0, 0, 0), (0, 1, 0))
    add([revolve_1.rotate(pattern_circular_2_axis, i * 360 / PATTERN_CIRCULAR_2_COUNT) for i in range(1, PATTERN_CIRCULAR_2_COUNT)])
    add([cut_extrude_3.rotate(pattern_circular_2_axis, i * 360 / PATTERN_CIRCULAR_2_COUNT) for i in range(1, PATTERN_CIRCULAR_2_COUNT)], mode=Mode.SUBTRACT)


solid = part.part
